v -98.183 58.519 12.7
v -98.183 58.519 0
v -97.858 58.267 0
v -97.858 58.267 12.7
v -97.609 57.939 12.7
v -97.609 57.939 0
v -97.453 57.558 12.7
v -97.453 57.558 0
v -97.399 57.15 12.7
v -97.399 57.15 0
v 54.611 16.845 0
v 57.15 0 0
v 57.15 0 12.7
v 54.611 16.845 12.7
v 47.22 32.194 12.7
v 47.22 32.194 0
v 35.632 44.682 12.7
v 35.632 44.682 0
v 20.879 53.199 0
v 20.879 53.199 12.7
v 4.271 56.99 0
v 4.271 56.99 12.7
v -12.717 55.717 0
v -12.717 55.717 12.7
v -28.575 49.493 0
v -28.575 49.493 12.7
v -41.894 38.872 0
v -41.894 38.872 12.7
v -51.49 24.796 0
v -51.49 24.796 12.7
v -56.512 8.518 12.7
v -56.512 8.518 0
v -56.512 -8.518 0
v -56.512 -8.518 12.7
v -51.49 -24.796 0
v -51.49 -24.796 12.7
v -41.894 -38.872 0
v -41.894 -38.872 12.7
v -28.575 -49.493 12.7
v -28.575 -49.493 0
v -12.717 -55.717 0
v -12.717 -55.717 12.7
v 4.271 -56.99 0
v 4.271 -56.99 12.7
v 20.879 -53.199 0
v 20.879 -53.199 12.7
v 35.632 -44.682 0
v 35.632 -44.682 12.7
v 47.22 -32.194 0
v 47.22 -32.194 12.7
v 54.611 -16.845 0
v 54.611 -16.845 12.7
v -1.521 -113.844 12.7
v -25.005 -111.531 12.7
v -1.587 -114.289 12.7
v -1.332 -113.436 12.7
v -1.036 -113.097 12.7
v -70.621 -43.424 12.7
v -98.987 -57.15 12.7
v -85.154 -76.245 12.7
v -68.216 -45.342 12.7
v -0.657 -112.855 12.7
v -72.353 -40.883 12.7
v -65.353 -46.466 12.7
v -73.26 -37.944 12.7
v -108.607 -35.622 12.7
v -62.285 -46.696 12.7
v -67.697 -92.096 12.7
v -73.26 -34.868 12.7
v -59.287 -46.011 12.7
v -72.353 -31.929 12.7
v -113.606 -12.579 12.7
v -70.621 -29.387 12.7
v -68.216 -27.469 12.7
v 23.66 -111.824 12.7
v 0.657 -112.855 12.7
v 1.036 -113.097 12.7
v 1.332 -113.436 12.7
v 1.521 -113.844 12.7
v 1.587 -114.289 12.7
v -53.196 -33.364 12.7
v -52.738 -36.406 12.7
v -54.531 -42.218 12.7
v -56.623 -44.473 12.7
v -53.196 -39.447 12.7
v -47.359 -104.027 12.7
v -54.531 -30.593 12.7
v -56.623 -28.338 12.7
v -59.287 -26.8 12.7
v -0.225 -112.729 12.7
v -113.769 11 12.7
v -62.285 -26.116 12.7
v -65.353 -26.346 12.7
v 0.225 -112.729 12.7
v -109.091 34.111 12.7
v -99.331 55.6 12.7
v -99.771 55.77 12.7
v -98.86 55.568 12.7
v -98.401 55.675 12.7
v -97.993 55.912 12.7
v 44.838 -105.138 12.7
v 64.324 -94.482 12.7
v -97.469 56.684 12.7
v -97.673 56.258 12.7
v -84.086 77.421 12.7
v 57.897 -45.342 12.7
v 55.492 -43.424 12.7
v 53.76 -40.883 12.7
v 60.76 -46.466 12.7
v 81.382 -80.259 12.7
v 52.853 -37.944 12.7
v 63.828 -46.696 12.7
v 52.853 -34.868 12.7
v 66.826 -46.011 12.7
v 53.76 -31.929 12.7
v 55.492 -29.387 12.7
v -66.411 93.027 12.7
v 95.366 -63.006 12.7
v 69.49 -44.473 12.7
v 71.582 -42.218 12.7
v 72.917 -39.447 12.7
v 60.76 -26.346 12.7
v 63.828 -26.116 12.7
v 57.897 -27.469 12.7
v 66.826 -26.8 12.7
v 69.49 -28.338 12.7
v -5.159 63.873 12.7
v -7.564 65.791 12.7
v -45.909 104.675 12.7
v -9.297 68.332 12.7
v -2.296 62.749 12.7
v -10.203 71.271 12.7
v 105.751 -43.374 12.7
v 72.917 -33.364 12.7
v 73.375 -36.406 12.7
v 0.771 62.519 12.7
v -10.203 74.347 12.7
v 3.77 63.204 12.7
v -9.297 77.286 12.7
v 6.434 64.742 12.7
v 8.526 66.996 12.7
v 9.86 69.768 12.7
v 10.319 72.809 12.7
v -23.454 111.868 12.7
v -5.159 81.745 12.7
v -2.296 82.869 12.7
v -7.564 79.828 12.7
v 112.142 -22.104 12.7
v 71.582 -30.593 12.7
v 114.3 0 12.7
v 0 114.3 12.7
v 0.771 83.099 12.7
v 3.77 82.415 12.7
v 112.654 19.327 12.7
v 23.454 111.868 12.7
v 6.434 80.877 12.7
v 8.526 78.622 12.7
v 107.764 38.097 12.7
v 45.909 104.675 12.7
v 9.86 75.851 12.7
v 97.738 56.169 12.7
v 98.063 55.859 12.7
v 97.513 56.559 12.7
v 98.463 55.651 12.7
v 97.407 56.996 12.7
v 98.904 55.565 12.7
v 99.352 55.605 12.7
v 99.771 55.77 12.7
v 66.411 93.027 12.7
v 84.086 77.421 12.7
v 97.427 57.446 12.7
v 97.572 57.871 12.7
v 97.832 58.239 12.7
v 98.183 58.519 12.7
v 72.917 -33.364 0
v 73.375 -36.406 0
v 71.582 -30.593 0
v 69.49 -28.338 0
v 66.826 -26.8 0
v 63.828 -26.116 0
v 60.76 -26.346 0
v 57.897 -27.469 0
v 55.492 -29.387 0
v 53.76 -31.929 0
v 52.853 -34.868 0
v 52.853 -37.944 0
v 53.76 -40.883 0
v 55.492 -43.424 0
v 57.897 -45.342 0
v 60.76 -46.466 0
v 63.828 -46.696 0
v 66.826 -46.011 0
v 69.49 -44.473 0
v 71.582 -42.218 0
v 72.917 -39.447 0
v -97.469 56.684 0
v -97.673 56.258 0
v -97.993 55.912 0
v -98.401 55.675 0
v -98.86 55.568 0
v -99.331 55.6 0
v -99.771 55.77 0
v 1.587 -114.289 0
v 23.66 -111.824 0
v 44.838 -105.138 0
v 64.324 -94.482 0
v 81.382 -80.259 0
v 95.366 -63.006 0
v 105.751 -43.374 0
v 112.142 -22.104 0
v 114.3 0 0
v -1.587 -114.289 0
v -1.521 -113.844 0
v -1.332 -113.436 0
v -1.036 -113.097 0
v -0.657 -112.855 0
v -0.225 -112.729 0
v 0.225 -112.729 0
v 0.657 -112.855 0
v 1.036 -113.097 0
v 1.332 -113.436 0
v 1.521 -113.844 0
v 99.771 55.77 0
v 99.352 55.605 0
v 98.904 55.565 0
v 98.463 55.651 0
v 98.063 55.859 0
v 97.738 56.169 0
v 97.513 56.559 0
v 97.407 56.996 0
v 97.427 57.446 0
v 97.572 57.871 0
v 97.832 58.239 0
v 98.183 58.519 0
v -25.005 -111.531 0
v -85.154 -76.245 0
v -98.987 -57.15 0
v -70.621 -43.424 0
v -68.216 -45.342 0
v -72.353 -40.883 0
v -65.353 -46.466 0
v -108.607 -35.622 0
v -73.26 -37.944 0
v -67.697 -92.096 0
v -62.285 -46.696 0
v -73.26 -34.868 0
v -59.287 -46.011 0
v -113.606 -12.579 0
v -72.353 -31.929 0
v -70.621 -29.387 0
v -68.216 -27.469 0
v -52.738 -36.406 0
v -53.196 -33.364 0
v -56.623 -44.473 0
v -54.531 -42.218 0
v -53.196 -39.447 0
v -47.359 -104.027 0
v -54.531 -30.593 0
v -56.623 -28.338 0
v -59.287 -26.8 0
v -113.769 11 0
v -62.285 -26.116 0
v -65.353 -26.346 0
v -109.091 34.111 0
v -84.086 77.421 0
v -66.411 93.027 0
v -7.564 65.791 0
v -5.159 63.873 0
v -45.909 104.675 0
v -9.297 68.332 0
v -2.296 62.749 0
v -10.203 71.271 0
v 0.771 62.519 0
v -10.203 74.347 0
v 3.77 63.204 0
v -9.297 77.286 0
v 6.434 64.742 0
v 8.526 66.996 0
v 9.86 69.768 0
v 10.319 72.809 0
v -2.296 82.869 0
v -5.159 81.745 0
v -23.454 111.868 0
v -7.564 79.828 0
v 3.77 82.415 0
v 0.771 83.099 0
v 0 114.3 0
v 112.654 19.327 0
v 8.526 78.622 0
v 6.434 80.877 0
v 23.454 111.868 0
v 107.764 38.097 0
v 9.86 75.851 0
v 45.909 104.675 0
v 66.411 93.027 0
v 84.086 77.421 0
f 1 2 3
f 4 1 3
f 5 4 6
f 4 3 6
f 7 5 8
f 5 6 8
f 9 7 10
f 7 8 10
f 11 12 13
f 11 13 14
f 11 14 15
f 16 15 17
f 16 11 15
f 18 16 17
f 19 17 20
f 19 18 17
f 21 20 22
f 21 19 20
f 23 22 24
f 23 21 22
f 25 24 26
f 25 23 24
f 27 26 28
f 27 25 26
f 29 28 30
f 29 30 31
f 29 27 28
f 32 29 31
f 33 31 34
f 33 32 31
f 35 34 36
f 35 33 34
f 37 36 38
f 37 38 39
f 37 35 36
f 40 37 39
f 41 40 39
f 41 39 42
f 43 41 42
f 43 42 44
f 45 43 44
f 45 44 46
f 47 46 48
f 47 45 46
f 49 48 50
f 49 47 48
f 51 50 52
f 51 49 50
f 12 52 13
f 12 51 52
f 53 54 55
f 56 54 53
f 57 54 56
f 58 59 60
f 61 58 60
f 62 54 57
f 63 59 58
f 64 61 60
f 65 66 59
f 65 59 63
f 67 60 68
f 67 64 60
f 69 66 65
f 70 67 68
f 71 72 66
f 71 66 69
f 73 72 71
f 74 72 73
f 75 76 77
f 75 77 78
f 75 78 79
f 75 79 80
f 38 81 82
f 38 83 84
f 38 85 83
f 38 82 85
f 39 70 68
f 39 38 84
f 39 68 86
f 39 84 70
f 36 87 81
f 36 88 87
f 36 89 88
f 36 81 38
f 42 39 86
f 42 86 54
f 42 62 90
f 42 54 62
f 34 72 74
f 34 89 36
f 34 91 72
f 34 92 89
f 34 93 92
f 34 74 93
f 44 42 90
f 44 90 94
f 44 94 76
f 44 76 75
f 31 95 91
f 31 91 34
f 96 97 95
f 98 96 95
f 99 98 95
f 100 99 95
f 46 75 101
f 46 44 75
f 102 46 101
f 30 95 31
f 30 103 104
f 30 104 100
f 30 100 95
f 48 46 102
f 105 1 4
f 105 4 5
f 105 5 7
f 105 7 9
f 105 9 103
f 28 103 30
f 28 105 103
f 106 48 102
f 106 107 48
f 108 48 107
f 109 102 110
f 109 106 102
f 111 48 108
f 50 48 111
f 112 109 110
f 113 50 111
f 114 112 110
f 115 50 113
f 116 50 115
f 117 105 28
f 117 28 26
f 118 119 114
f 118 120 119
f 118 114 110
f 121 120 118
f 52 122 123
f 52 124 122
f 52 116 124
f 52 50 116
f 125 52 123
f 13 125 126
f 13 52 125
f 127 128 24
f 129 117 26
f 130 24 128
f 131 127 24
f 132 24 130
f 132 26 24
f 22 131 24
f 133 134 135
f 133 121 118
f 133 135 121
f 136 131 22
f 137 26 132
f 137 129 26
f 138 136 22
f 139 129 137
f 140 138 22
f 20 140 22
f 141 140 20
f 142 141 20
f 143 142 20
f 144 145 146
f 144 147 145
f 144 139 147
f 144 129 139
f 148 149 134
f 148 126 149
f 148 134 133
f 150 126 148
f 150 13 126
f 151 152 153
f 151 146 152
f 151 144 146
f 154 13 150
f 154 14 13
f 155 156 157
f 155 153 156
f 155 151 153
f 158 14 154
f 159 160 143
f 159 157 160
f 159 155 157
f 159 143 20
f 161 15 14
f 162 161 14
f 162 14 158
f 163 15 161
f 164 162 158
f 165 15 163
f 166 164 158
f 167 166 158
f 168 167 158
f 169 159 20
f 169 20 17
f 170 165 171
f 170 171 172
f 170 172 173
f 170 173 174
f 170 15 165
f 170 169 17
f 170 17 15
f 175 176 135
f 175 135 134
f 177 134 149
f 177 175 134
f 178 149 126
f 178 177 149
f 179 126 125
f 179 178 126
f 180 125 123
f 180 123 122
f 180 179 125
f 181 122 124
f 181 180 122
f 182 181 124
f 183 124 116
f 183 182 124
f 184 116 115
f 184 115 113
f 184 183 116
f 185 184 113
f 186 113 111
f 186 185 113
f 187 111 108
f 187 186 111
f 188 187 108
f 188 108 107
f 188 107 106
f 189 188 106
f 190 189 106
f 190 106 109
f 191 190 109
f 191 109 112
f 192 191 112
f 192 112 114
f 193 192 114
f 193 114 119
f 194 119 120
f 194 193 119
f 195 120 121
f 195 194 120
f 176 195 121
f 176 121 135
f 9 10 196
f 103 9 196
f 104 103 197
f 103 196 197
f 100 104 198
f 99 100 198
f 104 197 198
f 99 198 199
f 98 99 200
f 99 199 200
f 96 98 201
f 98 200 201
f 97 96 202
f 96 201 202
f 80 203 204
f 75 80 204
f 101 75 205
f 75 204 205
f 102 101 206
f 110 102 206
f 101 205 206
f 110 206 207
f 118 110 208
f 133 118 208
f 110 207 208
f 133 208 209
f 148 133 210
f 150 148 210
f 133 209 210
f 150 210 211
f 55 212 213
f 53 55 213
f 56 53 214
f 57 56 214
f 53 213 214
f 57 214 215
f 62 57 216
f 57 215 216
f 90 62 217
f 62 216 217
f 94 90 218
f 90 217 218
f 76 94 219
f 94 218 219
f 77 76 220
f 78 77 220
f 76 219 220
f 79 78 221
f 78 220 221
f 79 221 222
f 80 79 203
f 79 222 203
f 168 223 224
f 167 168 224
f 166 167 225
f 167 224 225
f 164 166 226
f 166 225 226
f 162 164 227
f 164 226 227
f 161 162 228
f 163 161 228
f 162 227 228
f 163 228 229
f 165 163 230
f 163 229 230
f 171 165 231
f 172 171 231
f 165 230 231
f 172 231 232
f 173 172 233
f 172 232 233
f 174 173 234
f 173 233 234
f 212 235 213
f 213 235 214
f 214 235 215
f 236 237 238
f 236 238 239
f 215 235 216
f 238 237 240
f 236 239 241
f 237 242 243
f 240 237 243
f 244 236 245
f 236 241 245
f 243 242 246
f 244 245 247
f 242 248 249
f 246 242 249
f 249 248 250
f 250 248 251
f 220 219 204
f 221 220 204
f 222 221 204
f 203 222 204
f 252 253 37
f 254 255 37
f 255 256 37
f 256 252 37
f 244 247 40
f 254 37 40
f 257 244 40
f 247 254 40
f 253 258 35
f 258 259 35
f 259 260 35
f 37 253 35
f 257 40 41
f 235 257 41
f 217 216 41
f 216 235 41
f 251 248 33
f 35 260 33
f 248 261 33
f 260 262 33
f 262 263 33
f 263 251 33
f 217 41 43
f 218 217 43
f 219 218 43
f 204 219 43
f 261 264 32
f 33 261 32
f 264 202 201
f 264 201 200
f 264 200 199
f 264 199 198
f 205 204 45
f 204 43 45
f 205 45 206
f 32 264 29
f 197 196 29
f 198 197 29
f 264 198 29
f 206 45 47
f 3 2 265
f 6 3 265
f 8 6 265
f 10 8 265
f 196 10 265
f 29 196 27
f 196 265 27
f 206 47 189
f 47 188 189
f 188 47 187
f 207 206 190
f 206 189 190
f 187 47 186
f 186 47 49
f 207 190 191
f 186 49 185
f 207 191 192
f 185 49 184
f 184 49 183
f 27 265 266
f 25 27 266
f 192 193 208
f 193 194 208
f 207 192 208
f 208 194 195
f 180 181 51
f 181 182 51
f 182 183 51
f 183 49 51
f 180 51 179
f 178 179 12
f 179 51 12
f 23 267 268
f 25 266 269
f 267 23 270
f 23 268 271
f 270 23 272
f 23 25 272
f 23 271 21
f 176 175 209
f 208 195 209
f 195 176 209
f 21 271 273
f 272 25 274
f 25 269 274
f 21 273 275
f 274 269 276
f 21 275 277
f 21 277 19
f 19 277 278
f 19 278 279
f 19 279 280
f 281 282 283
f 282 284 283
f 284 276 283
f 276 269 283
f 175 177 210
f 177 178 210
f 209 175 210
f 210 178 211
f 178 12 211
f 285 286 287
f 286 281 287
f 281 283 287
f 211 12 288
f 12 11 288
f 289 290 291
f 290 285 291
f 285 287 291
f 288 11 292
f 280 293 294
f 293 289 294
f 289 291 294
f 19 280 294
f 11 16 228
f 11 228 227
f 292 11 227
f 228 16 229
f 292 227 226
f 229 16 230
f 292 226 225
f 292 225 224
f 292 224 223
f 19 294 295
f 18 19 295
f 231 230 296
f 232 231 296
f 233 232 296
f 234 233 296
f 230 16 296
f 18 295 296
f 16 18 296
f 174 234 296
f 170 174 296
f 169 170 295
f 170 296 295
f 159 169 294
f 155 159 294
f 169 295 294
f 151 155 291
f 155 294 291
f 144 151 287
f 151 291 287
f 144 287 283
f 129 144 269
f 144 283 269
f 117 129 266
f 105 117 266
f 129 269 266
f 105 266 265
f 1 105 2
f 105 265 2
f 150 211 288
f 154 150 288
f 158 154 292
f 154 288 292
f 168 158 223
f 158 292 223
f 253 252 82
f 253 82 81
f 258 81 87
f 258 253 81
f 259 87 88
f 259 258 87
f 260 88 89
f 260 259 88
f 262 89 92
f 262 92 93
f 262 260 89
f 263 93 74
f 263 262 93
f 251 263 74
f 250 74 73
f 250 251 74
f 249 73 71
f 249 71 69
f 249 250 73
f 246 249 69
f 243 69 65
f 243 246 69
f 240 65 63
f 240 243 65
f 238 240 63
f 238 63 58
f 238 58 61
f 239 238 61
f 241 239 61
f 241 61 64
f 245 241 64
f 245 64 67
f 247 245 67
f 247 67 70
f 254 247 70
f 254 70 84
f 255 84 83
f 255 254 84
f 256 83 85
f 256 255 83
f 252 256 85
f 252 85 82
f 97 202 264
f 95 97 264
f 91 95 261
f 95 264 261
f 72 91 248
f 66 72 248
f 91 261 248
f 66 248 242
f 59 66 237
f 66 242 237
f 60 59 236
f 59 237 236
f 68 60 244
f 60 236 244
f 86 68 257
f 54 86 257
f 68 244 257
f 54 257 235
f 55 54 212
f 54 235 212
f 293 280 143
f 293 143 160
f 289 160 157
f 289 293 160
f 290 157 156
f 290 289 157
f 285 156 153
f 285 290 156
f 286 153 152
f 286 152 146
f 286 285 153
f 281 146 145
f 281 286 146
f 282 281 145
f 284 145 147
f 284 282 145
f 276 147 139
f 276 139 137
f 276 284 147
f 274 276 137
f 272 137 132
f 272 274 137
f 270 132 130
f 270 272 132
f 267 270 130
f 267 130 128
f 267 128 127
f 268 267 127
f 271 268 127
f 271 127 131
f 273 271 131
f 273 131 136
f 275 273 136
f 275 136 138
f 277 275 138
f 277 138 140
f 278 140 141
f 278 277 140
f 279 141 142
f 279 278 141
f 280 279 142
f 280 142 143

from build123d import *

# Parameters (mm, degrees)
F0_R     = 10.31875
F0_R_2   = 57.15
F1_DEPTH = 12.7


with BuildPart() as f1:
    # F0 (on Top) → F1 (new body)
    with BuildSketch(Plane.XY):
        with BuildLine():
            ThreePointArc((1.587462, -114.288976), (81.381622, -80.25909), (114.3, 0))
            ThreePointArc((114.3, 0), (110.608097, 28.8156), (99.770887, 55.769706))
            ThreePointArc((99.770887, 55.769706), (97.611888, 56.35625), (98.183425, 58.51927))
            ThreePointArc((98.183425, 58.51927), (0, 114.3), (-98.183425, 58.51927))
            ThreePointArc((-98.183425, 58.51927), (-97.609141, 57.938972), (-97.399204, 57.15))
            ThreePointArc((-97.399204, 57.15), (-98.188185, 55.777949), (-99.770887, 55.769706))
            ThreePointArc((-99.770887, 55.769706), (-98.986704, -57.15), (-1.587462, -114.288976))
            ThreePointArc((-1.587462, -114.288976), (0, -112.7125), (1.587462, -114.288976))
        make_face()
        with Locations((-63.05647, -36.40567)):
            Circle(F0_R, mode=Mode.SUBTRACT)
        with Locations((63.05647, -36.40567)):
            Circle(F0_R, mode=Mode.SUBTRACT)
        Circle(F0_R_2, mode=Mode.SUBTRACT)
        with Locations((0, 72.8091)):
            Circle(F0_R, mode=Mode.SUBTRACT)
    extrude(amount=F1_DEPTH)


solid = f1.part
